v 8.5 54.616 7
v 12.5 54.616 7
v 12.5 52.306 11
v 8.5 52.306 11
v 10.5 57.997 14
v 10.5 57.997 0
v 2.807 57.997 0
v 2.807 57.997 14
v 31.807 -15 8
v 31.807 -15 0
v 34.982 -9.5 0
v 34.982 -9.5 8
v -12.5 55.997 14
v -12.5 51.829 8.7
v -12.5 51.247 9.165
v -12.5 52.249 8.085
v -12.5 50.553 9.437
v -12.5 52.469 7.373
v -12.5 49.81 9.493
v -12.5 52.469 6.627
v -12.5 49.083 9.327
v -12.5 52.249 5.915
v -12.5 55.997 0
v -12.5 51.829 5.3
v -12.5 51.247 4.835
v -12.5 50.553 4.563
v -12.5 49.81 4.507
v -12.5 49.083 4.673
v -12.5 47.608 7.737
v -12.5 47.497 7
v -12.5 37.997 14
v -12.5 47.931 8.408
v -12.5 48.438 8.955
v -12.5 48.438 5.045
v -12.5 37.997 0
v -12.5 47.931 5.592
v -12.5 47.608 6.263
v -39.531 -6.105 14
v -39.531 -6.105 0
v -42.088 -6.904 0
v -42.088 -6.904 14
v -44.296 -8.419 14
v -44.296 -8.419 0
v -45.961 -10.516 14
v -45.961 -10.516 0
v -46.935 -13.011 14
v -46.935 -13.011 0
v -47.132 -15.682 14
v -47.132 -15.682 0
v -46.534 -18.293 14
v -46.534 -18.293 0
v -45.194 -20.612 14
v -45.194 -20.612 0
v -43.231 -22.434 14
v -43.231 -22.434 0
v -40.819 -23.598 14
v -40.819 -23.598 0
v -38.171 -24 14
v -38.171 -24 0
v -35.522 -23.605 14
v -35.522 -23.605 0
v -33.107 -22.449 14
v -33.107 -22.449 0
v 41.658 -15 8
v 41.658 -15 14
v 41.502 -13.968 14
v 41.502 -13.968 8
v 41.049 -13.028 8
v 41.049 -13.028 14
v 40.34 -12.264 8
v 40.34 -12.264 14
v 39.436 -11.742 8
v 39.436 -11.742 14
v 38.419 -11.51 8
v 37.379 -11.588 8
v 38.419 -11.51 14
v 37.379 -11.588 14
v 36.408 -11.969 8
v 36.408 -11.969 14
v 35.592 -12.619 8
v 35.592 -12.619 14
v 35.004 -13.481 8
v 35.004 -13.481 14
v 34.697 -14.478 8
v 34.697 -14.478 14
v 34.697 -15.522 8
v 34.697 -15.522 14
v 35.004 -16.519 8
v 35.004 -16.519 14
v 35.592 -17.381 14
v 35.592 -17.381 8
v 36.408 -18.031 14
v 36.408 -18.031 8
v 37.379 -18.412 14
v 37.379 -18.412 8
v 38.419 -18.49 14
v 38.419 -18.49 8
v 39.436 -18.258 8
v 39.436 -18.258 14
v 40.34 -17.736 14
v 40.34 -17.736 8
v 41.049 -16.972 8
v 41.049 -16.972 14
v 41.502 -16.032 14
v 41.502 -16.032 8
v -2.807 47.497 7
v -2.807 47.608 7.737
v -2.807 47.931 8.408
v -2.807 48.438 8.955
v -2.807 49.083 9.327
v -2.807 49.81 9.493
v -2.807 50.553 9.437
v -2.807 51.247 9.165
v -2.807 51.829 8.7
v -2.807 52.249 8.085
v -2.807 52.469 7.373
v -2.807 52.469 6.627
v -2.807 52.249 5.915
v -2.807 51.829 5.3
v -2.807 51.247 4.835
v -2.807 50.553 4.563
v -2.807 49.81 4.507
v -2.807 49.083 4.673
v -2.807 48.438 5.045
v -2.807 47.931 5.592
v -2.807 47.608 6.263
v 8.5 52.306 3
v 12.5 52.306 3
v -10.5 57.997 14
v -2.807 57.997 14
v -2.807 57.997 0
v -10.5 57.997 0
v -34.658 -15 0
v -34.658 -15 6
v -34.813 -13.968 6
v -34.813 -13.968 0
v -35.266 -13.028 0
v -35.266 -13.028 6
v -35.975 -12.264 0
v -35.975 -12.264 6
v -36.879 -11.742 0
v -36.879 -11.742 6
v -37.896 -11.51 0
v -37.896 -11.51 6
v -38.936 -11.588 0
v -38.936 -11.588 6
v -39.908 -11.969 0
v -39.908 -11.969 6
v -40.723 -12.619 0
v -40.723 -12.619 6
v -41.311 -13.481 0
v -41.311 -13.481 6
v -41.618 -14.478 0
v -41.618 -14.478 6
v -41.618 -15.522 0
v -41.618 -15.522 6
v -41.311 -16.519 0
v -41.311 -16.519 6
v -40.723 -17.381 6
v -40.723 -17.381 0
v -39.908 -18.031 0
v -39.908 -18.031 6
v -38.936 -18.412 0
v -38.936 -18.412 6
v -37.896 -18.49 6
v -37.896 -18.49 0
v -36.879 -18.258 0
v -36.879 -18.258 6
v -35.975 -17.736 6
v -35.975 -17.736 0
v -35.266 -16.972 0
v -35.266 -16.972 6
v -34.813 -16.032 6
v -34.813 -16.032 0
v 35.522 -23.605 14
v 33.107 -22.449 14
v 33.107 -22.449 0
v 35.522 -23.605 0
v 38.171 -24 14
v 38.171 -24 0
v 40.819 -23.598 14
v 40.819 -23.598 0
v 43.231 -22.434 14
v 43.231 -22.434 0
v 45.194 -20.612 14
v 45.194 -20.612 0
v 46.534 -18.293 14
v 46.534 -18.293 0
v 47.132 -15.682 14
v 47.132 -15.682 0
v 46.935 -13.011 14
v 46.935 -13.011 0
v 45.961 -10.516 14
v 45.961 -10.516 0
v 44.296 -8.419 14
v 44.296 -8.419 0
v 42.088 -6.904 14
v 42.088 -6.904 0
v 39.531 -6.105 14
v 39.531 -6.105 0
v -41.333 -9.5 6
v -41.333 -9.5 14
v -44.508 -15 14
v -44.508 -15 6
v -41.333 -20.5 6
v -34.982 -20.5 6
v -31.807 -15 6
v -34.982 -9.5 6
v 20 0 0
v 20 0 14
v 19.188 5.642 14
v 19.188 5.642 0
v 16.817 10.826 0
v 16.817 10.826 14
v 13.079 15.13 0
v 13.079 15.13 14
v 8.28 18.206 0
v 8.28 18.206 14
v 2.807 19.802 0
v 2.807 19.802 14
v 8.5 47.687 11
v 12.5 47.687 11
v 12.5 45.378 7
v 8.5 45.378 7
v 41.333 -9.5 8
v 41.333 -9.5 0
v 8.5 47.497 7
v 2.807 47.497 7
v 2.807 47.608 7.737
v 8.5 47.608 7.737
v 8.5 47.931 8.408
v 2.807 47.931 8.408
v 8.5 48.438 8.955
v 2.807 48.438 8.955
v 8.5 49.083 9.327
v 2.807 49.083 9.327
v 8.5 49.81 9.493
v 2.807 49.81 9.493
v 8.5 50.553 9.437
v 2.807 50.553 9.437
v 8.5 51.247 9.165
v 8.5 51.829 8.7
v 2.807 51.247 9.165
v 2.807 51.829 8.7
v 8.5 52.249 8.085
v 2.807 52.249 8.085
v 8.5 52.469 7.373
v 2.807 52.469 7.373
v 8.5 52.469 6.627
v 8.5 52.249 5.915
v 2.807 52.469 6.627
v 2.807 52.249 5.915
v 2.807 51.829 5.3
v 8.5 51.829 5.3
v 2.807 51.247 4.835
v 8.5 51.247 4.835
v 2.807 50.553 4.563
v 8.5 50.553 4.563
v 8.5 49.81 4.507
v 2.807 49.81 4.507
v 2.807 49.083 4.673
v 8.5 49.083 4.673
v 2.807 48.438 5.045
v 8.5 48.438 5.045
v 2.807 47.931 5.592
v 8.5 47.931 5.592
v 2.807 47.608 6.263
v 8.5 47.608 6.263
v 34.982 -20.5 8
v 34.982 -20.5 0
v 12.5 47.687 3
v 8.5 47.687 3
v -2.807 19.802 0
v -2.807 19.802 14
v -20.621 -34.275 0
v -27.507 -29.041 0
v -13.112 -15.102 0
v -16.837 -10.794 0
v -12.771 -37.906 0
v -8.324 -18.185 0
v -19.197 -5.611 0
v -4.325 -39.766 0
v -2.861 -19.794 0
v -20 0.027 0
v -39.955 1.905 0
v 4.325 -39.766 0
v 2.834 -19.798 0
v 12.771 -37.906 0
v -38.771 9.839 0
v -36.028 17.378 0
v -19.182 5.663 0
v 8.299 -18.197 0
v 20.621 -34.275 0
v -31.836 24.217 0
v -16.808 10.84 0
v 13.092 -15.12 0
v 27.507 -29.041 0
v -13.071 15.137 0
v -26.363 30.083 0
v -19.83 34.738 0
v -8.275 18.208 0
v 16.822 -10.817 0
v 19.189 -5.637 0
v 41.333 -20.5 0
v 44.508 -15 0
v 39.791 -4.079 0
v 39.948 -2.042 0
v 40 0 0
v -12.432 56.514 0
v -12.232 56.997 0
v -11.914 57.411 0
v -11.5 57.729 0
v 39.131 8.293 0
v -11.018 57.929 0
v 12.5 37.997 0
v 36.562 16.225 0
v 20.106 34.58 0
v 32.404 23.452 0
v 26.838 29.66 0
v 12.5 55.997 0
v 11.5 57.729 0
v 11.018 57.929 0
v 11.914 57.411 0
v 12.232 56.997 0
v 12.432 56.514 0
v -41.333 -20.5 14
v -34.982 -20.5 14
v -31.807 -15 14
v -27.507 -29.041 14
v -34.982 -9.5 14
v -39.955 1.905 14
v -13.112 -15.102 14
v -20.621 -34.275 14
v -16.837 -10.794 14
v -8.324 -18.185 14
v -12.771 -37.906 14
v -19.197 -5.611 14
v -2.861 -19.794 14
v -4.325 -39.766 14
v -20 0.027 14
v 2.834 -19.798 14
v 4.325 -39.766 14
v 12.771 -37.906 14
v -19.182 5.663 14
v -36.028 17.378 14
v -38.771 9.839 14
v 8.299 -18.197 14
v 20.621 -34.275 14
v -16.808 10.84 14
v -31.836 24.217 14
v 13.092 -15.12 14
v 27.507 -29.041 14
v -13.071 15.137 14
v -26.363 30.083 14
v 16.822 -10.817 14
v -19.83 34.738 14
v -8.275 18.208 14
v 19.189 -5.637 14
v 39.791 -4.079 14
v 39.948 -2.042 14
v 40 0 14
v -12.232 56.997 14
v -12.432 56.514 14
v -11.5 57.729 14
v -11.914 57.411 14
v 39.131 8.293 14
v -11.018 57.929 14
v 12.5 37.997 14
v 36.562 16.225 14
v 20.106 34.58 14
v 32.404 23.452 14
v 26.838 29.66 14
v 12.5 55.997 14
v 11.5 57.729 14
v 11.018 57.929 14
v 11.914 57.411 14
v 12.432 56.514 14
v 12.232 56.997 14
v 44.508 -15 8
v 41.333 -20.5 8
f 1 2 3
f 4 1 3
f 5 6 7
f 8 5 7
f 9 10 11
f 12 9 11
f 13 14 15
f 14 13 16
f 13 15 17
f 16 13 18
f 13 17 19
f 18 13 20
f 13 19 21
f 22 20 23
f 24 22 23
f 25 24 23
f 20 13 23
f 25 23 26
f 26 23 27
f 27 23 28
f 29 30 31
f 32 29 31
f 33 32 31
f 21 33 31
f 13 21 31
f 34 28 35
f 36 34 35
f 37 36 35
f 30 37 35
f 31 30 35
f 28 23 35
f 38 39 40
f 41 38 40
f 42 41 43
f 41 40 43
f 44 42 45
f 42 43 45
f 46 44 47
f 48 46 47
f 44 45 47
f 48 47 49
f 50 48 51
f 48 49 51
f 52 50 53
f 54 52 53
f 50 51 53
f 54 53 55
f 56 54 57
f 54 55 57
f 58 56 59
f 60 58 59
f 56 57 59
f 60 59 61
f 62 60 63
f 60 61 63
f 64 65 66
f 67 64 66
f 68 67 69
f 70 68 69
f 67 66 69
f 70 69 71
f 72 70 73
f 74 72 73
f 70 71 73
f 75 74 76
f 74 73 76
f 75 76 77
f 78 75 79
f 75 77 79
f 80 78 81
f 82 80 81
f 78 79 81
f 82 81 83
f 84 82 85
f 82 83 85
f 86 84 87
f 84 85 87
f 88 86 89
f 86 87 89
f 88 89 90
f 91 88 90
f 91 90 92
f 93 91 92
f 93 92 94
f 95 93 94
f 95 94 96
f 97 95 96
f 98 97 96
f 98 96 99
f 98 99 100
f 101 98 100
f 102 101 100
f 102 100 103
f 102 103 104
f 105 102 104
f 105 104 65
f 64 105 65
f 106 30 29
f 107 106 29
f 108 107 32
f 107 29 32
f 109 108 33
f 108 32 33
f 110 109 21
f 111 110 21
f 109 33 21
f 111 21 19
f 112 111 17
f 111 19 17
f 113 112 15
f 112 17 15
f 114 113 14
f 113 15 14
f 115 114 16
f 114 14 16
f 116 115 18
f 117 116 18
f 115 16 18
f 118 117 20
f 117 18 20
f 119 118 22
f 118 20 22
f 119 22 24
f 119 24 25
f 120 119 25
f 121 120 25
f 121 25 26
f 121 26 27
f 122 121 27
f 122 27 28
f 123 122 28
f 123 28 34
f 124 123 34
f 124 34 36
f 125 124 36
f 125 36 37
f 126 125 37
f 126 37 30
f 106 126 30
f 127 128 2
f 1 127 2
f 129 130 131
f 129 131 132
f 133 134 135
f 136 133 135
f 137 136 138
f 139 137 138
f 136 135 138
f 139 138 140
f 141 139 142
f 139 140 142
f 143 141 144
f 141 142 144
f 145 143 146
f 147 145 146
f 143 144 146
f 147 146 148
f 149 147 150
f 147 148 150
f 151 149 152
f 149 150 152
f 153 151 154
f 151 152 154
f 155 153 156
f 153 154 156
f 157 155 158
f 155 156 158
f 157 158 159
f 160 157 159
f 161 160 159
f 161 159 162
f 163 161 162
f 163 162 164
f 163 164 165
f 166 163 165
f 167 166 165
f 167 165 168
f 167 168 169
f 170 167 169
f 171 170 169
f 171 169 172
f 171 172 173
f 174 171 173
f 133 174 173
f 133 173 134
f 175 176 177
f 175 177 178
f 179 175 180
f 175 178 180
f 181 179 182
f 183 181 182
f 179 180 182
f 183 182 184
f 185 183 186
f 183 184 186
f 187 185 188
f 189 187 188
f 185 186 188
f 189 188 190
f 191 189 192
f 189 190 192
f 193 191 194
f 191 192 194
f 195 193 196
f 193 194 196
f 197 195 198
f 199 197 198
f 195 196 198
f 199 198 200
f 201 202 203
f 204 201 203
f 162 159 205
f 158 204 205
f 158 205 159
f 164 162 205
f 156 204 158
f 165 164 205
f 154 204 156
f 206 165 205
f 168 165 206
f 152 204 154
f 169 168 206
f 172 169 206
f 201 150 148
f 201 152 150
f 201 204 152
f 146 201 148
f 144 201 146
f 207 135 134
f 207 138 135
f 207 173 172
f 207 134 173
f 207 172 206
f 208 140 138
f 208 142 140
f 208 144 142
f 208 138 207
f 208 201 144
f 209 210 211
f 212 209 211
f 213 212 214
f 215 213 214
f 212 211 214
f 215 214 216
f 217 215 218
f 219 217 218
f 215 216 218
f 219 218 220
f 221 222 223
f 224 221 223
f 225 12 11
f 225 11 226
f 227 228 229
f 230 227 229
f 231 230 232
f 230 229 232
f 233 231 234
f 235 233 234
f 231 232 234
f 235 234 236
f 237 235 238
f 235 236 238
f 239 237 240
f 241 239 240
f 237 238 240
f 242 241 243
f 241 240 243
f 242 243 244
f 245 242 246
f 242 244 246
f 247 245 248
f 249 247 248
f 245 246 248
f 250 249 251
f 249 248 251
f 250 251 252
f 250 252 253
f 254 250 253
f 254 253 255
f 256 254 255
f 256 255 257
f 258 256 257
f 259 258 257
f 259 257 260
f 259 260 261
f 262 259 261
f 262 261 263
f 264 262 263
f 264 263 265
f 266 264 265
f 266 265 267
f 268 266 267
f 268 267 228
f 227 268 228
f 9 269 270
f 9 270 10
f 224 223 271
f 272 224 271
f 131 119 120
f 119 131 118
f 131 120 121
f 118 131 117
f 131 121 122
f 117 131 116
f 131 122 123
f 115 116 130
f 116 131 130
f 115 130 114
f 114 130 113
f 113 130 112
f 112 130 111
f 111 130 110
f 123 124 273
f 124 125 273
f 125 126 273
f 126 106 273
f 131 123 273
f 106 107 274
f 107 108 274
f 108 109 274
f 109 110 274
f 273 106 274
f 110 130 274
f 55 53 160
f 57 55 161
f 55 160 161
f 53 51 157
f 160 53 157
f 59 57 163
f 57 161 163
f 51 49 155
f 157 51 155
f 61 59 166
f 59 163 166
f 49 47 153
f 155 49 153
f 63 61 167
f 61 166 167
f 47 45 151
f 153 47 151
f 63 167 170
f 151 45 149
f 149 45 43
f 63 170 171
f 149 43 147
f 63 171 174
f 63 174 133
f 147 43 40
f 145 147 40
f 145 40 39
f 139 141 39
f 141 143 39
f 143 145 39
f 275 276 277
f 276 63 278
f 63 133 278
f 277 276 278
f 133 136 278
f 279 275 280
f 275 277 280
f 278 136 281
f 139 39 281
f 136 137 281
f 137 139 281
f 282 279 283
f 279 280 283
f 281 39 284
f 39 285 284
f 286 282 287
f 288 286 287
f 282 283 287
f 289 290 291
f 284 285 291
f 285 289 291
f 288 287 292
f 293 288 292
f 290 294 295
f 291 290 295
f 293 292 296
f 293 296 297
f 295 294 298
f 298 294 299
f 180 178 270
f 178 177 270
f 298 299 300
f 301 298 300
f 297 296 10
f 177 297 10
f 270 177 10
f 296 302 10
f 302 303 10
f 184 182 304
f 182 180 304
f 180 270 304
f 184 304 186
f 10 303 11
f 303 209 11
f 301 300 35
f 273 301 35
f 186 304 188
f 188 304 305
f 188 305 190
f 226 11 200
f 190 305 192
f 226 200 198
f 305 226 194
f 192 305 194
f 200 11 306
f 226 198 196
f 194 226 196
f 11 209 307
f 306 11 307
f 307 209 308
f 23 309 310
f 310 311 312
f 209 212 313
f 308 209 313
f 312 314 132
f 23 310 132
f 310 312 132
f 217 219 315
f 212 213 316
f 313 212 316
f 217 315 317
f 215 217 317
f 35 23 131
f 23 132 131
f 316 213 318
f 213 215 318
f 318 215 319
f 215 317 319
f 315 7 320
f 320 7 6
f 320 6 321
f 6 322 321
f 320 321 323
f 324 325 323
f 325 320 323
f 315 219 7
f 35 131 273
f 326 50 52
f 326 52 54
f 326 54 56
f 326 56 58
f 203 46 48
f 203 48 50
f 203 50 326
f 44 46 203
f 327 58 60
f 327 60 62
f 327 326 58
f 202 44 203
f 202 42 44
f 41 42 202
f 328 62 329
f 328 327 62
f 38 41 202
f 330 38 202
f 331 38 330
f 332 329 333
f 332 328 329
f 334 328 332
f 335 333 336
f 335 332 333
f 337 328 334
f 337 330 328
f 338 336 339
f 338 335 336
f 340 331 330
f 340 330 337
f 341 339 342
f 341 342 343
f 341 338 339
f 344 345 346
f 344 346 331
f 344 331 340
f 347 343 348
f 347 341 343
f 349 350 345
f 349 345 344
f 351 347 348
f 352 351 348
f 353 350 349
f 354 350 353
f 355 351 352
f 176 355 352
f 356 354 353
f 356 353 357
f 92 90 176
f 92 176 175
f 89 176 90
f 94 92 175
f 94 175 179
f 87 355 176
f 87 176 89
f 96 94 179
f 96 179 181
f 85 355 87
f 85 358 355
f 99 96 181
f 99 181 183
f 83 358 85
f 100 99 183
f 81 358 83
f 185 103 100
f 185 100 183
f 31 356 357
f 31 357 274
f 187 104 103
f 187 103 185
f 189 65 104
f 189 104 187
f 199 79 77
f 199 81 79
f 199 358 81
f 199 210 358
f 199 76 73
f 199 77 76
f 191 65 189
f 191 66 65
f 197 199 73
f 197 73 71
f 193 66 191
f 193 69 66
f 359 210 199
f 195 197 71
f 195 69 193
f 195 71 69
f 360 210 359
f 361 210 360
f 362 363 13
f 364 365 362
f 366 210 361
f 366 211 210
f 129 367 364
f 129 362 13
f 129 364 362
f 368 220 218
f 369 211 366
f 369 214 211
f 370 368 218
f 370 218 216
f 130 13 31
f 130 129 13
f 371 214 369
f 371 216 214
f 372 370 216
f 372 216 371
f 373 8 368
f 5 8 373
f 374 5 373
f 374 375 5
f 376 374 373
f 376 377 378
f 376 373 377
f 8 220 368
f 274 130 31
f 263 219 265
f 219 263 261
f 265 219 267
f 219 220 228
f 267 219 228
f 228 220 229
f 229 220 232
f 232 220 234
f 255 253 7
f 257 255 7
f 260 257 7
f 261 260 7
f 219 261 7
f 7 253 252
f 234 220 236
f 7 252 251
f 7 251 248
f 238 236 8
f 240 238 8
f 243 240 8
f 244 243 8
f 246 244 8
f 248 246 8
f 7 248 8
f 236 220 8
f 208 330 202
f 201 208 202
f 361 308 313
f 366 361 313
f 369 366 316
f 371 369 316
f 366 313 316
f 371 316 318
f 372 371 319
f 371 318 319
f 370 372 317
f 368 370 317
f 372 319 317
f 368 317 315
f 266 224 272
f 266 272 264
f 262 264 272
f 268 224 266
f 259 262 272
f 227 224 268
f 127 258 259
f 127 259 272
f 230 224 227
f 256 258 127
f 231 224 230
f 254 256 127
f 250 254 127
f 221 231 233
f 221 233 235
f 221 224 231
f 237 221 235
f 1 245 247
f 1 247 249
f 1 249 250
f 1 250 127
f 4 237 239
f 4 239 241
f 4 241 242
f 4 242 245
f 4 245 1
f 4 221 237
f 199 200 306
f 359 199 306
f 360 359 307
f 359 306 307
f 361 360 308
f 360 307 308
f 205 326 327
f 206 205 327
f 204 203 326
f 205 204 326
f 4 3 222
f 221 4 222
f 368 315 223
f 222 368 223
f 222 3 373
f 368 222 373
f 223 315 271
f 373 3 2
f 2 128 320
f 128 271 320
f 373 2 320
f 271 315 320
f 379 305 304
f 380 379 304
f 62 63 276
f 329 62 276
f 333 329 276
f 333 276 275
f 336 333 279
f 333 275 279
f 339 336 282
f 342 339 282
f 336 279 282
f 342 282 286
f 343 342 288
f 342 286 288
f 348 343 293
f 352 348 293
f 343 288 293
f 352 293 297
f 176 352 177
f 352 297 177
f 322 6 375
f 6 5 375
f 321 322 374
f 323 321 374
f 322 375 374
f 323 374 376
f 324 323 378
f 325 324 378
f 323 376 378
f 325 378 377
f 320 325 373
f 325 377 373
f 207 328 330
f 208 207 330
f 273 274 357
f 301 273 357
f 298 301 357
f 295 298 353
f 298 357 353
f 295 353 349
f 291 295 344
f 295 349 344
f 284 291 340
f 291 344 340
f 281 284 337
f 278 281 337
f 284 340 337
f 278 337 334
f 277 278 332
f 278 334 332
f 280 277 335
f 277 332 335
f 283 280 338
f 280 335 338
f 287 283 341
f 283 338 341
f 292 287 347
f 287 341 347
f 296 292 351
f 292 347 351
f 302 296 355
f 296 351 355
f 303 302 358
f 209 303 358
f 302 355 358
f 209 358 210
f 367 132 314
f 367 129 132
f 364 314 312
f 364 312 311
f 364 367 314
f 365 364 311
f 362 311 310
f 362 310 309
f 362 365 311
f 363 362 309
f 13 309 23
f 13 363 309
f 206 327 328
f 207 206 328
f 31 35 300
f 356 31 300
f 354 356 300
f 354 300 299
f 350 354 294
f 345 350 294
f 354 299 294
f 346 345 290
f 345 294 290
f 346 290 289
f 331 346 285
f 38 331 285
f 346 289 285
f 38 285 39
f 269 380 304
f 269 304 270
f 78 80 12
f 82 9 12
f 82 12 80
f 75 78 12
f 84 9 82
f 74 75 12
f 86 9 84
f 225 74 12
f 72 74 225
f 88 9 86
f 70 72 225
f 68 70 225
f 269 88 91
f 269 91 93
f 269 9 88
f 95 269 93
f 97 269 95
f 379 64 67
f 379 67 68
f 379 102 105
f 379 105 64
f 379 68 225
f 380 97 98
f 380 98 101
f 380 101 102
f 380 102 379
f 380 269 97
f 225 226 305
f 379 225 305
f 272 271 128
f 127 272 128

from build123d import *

# Parameters (mm, degrees)
F1_DEPTH  = 14
F3_DEPTH  = 25
F4_R      = 9
F5_DEPTH  = 14
F6_R      = 3.5
F7_DEPTH  = 25
F8_R      = 2.5
F9_DEPTH  = 25
F11_DEPTH = 4
F13_DEPTH = 8
F15_DEPTH = 8
F16_R     = 2


with BuildPart() as f1:
    # F0 (on Top) → F1 (new body)
    with BuildSketch(Plane.XY):
        with BuildLine():
            ThreePointArc((-12.5, 37.9967103839), (-23.4520787991, -32.403703492), (40, 0))
            ThreePointArc((40, 0), (32.403703492, 23.4520787991), (12.5, 37.9967103839))
            Line((12.5, 37.9967103839), (-12.5, 37.9967103839))
        make_face()
        with BuildLine():
            Line((-12.5, 37.9967103839), (12.5, 37.9967103839))
            ThreePointArc((12.5, 37.9967103839), (0, 40), (-12.5, 37.9967103839))
        make_face()
        with BuildLine():
            ThreePointArc((-12.5, 37.9967103839), (0, 40), (12.5, 37.9967103839))
            Line((12.5, 37.9967103839), (12.5, 57.9967103839))
            Line((12.5, 57.9967103839), (-12.5, 57.9967103839))
            Line((-12.5, 57.9967103839), (-12.5, 37.9967103839))
        make_face()
    extrude(amount=F1_DEPTH)

    # F2 (on face) → F3 (cut)
    with BuildSketch(Plane.XY.offset(14)):
        with BuildLine():
            ThreePointArc((-2.807373056, 19.8019861762), (-13.112065796, -15.102110136), (20, 0))
            ThreePointArc((20, 0), (15.102110136, 13.112065796), (2.807373056, 19.8019861762))
            Line((2.807373056, 19.8019861762), (-2.807373056, 19.8019861762))
        make_face()
        with BuildLine():
            Line((-2.807373056, 19.8019861762), (2.807373056, 19.8019861762))
            ThreePointArc((2.807373056, 19.8019861762), (0, 20), (-2.807373056, 19.8019861762))
        make_face()
        with BuildLine():
            ThreePointArc((-2.807373056, 19.8019861762), (0, 20), (2.807373056, 19.8019861762))
            Line((2.807373056, 19.8019861762), (2.807373056, 57.9967103839))
            Line((2.807373056, 57.9967103839), (-2.807373056, 57.9967103839))
            Line((-2.807373056, 57.9967103839), (-2.807373056, 19.8019861762))
        make_face()
    extrude(amount=-F3_DEPTH, mode=Mode.SUBTRACT)

    # F4 (on Top) → F5 (join)
    with BuildSketch(Plane.XY):
        with Locations((-38.1575680567, -15)):
            Circle(F4_R)
        with Locations((38.1575680567, -15)):
            Circle(F4_R)
    extrude(amount=F5_DEPTH)

    # F6 (on face) → F7 (cut)
    with BuildSketch(Plane.XY.offset(14)):
        with Locations((-38.1575680567, -15)):
            Circle(F6_R)
        with Locations((38.1575680567, -15)):
            Circle(F6_R)
    extrude(amount=-F7_DEPTH, mode=Mode.SUBTRACT)

    # F8 (on face) → F9 (cut)
    with BuildSketch(Plane(origin=(-12.5, 0, 0), x_dir=(0, -1, 0), z_dir=(-1, 0, 0))):
        with Locations((-49.9967103839, 7)):
            Circle(F8_R)
    extrude(amount=-F9_DEPTH, mode=Mode.SUBTRACT)

    # F10 (on face) → F11 (cut)
    with BuildSketch(Plane.YZ.offset(12.5)):
        Polygon((54.6155125374, 7), (52.3061114607, 11), (47.6873093072, 11), (45.3779082304, 7), (47.6873093072, 3), (52.3061114607, 3), align=None)
    extrude(amount=-F11_DEPTH, mode=Mode.SUBTRACT)

    # F12 (on face) → F13 (cut)
    with BuildSketch(Plane(origin=(0, 0, 0), x_dir=(1, 0, 0), z_dir=(0, 0, -1))):
        Polygon((41.3329945372, 20.5), (34.9821415761, 20.5), (31.8067150956, 15), (34.9821415761, 9.5), (41.3329945372, 9.5), (44.5084210178, 15), align=None)
    extrude(amount=-F13_DEPTH, mode=Mode.SUBTRACT)

    # F14 (on face) → F15 (cut)
    with BuildSketch(Plane.XY.offset(14)):
        Polygon((-31.8067150956, -15), (-34.9821415761, -9.5), (-41.3329945372, -9.5), (-44.5084210178, -15), (-41.3329945372, -20.5), (-34.9821415761, -20.5), align=None)
    extrude(amount=-F15_DEPTH, mode=Mode.SUBTRACT)

    # F16
    f16_edges = [f1.edges().sort_by_distance(p)[0] for p in [
        (12.5, 57.99671, 7),
        (-12.5, 57.99671, 7),
    ]]
    fillet(f16_edges, radius=F16_R)


solid = f1.part
